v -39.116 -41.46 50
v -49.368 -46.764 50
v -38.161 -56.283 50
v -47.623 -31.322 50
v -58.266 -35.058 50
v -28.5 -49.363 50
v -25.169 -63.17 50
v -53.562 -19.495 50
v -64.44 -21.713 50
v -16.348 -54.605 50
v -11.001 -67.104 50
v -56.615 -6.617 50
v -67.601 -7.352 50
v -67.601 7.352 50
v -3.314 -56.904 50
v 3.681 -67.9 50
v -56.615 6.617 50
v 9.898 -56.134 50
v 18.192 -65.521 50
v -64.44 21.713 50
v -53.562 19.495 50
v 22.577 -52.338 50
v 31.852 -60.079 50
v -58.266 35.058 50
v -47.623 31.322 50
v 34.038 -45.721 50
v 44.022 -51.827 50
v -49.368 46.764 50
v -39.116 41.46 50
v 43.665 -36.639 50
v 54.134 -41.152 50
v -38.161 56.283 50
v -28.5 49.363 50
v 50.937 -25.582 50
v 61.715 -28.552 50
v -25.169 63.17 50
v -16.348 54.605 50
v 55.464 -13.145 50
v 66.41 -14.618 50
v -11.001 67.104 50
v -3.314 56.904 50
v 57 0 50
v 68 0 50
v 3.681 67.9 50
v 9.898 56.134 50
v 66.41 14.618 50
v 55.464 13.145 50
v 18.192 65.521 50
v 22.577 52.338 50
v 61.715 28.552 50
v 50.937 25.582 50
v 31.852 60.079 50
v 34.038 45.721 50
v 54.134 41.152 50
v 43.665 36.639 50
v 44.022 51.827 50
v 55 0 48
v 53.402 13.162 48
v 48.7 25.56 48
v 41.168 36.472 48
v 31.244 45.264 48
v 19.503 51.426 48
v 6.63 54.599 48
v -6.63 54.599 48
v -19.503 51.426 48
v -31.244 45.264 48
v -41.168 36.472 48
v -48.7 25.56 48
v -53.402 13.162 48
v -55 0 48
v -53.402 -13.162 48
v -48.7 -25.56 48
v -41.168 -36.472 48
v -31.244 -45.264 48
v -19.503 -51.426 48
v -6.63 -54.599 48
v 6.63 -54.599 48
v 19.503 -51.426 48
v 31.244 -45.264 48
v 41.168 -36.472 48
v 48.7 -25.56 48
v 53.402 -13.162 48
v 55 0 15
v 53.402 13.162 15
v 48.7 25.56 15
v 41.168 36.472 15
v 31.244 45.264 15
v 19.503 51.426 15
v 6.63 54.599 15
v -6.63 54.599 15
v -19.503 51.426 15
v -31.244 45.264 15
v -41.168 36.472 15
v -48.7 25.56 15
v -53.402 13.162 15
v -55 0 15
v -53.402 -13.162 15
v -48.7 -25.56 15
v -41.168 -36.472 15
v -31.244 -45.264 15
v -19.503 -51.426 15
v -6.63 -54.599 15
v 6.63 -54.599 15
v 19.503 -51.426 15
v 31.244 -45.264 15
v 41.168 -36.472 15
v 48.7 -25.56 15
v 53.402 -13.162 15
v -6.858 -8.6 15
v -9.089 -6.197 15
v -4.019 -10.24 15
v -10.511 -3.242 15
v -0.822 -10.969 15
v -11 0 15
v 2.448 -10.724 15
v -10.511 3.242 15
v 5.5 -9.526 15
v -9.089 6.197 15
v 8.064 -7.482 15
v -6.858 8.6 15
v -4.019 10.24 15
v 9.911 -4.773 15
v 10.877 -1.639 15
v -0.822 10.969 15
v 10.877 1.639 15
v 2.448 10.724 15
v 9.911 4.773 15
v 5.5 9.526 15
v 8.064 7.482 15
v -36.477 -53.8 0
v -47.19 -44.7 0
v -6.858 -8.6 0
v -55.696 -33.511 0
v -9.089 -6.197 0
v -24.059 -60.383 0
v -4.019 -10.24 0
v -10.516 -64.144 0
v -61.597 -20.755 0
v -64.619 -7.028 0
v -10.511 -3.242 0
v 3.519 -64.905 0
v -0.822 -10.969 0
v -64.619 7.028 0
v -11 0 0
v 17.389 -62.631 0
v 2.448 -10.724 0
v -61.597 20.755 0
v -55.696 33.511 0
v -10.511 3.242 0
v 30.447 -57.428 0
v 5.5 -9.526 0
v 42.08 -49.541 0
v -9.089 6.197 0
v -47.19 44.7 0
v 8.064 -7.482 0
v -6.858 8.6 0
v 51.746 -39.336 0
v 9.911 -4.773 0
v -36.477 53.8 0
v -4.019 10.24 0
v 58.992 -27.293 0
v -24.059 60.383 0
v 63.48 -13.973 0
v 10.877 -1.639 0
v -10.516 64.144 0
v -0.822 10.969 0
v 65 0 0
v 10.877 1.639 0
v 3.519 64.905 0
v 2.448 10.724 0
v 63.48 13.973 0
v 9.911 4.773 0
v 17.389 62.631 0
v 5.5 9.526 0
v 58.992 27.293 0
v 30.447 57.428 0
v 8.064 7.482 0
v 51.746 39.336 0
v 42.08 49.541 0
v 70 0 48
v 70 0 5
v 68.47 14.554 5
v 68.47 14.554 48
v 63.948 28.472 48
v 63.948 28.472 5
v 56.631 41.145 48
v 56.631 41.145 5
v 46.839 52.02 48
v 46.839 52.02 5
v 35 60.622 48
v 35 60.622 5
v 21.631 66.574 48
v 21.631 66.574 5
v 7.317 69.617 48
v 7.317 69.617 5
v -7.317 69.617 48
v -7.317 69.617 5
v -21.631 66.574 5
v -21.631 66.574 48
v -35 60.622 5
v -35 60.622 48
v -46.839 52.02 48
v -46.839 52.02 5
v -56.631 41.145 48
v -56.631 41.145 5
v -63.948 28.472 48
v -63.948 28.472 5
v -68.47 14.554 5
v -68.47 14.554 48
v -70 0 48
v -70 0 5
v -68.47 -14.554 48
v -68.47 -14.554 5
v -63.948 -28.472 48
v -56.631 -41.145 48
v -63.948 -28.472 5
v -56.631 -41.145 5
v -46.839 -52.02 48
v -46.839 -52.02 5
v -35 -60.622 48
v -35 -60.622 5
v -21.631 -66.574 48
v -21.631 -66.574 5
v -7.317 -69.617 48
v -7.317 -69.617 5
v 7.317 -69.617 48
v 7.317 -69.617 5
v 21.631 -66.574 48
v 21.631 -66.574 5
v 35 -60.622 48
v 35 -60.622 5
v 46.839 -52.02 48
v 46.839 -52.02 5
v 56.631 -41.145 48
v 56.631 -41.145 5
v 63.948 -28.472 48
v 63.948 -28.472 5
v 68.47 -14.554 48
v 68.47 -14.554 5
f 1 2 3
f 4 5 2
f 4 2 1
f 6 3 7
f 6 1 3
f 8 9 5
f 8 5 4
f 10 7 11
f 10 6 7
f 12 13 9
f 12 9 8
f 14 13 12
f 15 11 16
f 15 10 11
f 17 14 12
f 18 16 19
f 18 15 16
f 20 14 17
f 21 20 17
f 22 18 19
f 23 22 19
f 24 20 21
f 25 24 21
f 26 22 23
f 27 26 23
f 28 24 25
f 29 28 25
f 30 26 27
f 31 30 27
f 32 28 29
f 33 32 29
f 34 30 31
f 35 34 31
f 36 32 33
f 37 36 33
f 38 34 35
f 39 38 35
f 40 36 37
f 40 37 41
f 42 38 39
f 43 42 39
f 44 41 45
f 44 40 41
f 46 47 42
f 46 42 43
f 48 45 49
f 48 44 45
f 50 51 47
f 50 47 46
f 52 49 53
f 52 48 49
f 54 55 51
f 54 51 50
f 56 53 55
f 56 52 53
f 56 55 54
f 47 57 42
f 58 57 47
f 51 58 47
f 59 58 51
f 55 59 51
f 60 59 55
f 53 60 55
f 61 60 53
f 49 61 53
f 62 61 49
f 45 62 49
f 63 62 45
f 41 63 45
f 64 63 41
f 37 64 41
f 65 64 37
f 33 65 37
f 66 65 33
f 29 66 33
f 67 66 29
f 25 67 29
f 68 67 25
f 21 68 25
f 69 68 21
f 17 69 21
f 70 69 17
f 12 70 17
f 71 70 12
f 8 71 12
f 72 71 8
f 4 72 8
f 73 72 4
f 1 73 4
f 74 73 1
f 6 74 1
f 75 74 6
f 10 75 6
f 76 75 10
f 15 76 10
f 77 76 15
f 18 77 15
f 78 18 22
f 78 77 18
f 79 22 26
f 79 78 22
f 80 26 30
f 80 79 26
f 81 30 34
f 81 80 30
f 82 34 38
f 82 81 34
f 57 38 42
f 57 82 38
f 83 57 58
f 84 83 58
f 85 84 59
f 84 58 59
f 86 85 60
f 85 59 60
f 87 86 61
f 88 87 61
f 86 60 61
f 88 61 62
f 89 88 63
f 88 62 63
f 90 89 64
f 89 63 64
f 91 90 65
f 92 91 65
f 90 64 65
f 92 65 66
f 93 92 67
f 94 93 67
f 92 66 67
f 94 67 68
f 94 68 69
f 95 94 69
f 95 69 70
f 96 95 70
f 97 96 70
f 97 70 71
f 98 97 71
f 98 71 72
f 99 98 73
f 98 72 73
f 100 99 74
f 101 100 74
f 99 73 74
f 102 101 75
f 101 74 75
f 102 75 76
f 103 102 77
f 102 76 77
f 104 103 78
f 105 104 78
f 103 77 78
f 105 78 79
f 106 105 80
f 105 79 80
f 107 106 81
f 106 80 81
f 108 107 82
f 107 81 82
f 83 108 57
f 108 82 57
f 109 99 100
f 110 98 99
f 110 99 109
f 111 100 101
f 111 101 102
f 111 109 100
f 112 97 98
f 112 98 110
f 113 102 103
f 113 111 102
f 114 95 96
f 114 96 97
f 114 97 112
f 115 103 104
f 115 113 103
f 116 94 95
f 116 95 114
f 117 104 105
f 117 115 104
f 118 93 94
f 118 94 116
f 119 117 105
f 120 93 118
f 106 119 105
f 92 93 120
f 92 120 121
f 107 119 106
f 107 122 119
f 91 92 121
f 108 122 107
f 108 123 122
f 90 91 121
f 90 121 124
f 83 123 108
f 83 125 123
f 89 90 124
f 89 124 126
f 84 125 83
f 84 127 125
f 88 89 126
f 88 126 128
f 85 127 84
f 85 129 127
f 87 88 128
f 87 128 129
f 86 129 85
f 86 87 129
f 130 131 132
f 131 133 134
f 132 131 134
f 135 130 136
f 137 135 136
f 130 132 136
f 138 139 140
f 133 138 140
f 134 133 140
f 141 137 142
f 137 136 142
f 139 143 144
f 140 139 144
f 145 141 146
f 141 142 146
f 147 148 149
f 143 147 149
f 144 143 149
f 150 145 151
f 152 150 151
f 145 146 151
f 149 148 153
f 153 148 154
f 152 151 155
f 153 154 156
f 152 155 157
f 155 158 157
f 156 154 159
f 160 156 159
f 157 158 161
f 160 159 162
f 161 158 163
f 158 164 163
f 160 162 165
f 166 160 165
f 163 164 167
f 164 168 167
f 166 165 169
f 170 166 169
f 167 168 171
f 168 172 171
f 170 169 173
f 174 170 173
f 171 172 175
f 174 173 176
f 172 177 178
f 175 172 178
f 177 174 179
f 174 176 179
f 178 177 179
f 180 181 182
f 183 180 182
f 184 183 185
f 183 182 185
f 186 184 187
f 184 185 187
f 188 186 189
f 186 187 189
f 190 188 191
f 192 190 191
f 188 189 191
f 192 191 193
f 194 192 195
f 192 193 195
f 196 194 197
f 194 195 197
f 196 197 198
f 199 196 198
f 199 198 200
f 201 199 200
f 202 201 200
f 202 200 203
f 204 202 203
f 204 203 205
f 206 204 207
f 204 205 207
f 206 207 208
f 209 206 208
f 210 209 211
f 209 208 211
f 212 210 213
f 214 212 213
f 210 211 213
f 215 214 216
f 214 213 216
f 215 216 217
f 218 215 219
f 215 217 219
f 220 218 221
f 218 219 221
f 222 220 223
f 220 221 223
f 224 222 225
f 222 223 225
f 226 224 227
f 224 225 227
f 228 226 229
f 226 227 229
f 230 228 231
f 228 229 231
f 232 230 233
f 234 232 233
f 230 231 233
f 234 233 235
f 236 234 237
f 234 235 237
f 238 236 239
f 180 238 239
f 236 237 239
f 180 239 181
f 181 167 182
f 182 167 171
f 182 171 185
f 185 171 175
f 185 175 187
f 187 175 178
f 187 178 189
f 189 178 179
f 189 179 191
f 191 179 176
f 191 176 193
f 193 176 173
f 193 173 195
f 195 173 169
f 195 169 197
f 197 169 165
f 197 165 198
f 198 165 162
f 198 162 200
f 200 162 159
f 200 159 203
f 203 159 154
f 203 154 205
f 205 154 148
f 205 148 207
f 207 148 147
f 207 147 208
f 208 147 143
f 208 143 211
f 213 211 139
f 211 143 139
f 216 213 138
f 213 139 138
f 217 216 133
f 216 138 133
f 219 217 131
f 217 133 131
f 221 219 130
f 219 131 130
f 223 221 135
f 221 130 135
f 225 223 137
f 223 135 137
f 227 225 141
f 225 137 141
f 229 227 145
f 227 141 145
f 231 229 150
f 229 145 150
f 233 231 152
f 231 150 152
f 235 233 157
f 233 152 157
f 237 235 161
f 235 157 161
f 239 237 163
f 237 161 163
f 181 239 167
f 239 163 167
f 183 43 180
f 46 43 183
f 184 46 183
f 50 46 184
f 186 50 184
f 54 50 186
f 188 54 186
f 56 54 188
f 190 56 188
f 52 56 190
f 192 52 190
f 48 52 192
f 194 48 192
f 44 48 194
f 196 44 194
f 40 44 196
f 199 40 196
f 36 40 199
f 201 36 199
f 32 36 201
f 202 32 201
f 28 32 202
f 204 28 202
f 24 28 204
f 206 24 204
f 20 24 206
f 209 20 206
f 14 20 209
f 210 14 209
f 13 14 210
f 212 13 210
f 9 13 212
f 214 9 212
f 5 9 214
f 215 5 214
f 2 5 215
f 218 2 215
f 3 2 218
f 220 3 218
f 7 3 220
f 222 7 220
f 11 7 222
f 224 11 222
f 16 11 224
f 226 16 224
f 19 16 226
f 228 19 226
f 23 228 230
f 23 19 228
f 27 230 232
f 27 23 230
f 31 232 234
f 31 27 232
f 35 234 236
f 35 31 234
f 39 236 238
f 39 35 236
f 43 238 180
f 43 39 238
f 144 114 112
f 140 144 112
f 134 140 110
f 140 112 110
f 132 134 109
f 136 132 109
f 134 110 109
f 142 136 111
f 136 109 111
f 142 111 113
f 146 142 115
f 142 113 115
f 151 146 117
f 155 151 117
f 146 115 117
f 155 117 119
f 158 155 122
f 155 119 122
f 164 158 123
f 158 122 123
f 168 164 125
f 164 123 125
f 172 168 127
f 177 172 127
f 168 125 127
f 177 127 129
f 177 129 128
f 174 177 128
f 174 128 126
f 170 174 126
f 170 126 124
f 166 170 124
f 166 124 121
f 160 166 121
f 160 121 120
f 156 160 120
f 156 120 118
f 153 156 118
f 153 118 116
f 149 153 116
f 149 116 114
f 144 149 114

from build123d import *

# Parameters (mm, degrees)
F0_R     = 70
F1_DEPTH = 50
F2_R     = 55
F3_DEPTH = 35
F4_SIZE  = 5
F5_SIZE  = 2
F7_D     = 22
F7_DEPTH = 30
F7_TIP   = 6.6094668093


with BuildPart() as f1:
    # F0 (on Top) → F1 (new body)
    with BuildSketch(Plane.XY):
        Circle(F0_R)
    extrude(amount=F1_DEPTH)

    # F2 (on face) → F3 (cut)
    with BuildSketch(Plane.XY.offset(50)):
        Circle(F2_R)
    extrude(amount=-F3_DEPTH, mode=Mode.SUBTRACT)

    # F4
    f4_edges = [f1.edges().sort_by_distance(p)[0] for p in [
        (-70, 0, 0),
    ]]
    chamfer(f4_edges, length=F4_SIZE)

    # F5
    f5_edges = [f1.edges().sort_by_distance(p)[0] for p in [
        (-70, 0, 50),
        (-55, 0, 50),
    ]]
    chamfer(f5_edges, length=F5_SIZE)

    # F7
    with Locations(Plane(origin=(0, 0, 0), x_dir=(1, 0, 0), z_dir=(0, 0, -1))):
        with Locations((0, 0)):
            Hole(F7_D / 2, depth=F7_DEPTH)
            with Locations((0, 0, -(F7_DEPTH + F7_TIP / 2))):  # 118° drill point
                Cone(0, F7_D / 2, F7_TIP, mode=Mode.SUBTRACT)


solid = f1.part
